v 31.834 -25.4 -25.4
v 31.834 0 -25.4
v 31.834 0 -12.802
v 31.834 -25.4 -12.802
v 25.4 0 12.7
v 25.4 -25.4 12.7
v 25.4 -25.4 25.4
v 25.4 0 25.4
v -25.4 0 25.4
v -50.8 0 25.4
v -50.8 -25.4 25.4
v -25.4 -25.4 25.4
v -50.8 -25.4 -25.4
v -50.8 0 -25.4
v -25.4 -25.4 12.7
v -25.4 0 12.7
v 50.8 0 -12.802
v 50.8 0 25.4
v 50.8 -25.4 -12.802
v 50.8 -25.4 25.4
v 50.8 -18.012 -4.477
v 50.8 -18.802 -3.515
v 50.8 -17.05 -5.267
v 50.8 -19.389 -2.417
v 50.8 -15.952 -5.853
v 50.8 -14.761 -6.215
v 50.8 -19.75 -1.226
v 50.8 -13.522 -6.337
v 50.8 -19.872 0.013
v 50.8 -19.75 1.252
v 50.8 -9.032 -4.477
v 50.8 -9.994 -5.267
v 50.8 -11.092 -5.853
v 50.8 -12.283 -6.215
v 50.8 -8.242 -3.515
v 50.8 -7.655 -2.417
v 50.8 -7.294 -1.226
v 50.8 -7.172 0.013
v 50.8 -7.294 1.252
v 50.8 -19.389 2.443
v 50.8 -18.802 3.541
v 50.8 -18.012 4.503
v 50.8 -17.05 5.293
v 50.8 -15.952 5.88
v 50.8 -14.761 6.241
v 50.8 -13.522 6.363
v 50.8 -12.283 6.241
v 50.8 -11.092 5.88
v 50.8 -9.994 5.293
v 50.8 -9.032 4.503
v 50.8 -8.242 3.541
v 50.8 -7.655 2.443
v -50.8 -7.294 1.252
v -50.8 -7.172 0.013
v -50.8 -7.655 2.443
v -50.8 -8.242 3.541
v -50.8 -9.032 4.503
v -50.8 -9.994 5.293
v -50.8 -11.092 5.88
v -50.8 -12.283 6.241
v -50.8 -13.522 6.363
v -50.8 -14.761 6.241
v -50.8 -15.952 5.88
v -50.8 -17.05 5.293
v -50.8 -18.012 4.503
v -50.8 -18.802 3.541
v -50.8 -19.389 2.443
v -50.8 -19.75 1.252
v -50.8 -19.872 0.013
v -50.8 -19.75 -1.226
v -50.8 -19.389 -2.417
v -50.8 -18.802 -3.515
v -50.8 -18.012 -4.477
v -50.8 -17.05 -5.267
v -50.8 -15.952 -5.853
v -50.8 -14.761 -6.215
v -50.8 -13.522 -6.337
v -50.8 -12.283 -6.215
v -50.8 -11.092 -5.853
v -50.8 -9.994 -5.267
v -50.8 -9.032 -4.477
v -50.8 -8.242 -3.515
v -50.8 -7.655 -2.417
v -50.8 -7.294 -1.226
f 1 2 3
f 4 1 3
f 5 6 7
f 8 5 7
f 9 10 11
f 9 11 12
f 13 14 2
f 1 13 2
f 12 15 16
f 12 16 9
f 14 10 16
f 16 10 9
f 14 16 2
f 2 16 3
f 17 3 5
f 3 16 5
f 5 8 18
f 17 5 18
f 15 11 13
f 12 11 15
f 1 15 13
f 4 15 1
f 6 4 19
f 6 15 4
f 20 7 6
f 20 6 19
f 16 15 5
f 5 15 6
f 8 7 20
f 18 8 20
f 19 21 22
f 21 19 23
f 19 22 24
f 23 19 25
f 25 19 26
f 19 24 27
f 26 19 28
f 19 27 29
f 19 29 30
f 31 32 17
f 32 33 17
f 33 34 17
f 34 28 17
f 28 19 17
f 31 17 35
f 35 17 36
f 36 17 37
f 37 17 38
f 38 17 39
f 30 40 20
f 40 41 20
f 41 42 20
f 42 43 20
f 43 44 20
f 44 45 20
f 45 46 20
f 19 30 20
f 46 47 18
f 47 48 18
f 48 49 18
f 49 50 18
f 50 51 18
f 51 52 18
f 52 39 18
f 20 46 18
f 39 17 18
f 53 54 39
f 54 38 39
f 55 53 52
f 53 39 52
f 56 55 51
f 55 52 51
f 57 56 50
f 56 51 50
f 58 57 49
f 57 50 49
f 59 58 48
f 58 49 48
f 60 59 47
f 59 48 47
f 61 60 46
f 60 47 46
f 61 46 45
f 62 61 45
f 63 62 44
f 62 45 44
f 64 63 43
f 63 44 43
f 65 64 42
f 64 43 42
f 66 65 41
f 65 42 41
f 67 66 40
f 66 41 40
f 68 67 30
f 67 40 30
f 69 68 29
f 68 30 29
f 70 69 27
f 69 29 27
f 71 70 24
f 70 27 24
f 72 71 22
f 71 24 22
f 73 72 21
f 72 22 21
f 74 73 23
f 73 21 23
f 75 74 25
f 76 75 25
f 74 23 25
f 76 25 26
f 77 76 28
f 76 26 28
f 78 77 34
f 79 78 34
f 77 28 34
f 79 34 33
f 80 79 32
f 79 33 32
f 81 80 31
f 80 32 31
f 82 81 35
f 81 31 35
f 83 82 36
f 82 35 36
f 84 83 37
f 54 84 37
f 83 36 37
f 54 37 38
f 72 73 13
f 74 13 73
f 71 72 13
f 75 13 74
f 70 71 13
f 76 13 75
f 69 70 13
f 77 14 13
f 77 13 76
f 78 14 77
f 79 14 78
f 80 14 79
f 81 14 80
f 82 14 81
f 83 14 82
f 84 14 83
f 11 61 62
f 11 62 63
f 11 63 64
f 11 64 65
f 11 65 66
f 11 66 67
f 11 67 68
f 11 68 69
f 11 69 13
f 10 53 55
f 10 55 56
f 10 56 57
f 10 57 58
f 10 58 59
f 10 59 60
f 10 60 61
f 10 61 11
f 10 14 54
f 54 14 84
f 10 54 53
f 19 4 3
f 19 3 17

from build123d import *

# Parameters (mm, degrees)
F0_W     = 101.6
F0_H     = 50.8
F1_DEPTH = 25.4
F2_W     = 50.8
F2_H     = 12.7
F3_DEPTH = 25.401
F4_W     = 19.05
F4_H     = 12.7
F5_DEPTH = 25.401
F6_R     = 6.35
F7_DEPTH = 50.801
F8_DEPTH = 50.801


with BuildPart() as f1:
    # F0 (on Front) → F1 (new body)
    with BuildSketch(Plane.XZ):
        Rectangle(F0_W, F0_H)
    extrude(amount=F1_DEPTH)

    # F2 (on face) → F3 (cut, through all)
    with BuildSketch(Plane.XZ.offset(25.4)):
        with Locations((0, 19.05)):
            Rectangle(F2_W, F2_H)
    extrude(amount=-F3_DEPTH, mode=Mode.SUBTRACT)

    # F4 (on Front) → F5 (cut, through all)
    with BuildSketch(Plane.XZ):
        with Locations((41.358551, -19.152182)):
            Rectangle(F4_W, F4_H)
    extrude(amount=F5_DEPTH, mode=Mode.SUBTRACT)

    # F6 (on Right) → F7 (cut, through all)
    with BuildSketch(Plane.YZ):
        with Locations((-13.521904, 0.013301)):
            Circle(F6_R)
    extrude(amount=-F7_DEPTH, mode=Mode.SUBTRACT)

    # F6 (on Right) → F8 (cut, through all)
    with BuildSketch(Plane.YZ):
        with Locations((-13.521904, 0.013301)):
            Circle(F6_R)
    extrude(amount=F8_DEPTH, mode=Mode.SUBTRACT)


solid = f1.part
